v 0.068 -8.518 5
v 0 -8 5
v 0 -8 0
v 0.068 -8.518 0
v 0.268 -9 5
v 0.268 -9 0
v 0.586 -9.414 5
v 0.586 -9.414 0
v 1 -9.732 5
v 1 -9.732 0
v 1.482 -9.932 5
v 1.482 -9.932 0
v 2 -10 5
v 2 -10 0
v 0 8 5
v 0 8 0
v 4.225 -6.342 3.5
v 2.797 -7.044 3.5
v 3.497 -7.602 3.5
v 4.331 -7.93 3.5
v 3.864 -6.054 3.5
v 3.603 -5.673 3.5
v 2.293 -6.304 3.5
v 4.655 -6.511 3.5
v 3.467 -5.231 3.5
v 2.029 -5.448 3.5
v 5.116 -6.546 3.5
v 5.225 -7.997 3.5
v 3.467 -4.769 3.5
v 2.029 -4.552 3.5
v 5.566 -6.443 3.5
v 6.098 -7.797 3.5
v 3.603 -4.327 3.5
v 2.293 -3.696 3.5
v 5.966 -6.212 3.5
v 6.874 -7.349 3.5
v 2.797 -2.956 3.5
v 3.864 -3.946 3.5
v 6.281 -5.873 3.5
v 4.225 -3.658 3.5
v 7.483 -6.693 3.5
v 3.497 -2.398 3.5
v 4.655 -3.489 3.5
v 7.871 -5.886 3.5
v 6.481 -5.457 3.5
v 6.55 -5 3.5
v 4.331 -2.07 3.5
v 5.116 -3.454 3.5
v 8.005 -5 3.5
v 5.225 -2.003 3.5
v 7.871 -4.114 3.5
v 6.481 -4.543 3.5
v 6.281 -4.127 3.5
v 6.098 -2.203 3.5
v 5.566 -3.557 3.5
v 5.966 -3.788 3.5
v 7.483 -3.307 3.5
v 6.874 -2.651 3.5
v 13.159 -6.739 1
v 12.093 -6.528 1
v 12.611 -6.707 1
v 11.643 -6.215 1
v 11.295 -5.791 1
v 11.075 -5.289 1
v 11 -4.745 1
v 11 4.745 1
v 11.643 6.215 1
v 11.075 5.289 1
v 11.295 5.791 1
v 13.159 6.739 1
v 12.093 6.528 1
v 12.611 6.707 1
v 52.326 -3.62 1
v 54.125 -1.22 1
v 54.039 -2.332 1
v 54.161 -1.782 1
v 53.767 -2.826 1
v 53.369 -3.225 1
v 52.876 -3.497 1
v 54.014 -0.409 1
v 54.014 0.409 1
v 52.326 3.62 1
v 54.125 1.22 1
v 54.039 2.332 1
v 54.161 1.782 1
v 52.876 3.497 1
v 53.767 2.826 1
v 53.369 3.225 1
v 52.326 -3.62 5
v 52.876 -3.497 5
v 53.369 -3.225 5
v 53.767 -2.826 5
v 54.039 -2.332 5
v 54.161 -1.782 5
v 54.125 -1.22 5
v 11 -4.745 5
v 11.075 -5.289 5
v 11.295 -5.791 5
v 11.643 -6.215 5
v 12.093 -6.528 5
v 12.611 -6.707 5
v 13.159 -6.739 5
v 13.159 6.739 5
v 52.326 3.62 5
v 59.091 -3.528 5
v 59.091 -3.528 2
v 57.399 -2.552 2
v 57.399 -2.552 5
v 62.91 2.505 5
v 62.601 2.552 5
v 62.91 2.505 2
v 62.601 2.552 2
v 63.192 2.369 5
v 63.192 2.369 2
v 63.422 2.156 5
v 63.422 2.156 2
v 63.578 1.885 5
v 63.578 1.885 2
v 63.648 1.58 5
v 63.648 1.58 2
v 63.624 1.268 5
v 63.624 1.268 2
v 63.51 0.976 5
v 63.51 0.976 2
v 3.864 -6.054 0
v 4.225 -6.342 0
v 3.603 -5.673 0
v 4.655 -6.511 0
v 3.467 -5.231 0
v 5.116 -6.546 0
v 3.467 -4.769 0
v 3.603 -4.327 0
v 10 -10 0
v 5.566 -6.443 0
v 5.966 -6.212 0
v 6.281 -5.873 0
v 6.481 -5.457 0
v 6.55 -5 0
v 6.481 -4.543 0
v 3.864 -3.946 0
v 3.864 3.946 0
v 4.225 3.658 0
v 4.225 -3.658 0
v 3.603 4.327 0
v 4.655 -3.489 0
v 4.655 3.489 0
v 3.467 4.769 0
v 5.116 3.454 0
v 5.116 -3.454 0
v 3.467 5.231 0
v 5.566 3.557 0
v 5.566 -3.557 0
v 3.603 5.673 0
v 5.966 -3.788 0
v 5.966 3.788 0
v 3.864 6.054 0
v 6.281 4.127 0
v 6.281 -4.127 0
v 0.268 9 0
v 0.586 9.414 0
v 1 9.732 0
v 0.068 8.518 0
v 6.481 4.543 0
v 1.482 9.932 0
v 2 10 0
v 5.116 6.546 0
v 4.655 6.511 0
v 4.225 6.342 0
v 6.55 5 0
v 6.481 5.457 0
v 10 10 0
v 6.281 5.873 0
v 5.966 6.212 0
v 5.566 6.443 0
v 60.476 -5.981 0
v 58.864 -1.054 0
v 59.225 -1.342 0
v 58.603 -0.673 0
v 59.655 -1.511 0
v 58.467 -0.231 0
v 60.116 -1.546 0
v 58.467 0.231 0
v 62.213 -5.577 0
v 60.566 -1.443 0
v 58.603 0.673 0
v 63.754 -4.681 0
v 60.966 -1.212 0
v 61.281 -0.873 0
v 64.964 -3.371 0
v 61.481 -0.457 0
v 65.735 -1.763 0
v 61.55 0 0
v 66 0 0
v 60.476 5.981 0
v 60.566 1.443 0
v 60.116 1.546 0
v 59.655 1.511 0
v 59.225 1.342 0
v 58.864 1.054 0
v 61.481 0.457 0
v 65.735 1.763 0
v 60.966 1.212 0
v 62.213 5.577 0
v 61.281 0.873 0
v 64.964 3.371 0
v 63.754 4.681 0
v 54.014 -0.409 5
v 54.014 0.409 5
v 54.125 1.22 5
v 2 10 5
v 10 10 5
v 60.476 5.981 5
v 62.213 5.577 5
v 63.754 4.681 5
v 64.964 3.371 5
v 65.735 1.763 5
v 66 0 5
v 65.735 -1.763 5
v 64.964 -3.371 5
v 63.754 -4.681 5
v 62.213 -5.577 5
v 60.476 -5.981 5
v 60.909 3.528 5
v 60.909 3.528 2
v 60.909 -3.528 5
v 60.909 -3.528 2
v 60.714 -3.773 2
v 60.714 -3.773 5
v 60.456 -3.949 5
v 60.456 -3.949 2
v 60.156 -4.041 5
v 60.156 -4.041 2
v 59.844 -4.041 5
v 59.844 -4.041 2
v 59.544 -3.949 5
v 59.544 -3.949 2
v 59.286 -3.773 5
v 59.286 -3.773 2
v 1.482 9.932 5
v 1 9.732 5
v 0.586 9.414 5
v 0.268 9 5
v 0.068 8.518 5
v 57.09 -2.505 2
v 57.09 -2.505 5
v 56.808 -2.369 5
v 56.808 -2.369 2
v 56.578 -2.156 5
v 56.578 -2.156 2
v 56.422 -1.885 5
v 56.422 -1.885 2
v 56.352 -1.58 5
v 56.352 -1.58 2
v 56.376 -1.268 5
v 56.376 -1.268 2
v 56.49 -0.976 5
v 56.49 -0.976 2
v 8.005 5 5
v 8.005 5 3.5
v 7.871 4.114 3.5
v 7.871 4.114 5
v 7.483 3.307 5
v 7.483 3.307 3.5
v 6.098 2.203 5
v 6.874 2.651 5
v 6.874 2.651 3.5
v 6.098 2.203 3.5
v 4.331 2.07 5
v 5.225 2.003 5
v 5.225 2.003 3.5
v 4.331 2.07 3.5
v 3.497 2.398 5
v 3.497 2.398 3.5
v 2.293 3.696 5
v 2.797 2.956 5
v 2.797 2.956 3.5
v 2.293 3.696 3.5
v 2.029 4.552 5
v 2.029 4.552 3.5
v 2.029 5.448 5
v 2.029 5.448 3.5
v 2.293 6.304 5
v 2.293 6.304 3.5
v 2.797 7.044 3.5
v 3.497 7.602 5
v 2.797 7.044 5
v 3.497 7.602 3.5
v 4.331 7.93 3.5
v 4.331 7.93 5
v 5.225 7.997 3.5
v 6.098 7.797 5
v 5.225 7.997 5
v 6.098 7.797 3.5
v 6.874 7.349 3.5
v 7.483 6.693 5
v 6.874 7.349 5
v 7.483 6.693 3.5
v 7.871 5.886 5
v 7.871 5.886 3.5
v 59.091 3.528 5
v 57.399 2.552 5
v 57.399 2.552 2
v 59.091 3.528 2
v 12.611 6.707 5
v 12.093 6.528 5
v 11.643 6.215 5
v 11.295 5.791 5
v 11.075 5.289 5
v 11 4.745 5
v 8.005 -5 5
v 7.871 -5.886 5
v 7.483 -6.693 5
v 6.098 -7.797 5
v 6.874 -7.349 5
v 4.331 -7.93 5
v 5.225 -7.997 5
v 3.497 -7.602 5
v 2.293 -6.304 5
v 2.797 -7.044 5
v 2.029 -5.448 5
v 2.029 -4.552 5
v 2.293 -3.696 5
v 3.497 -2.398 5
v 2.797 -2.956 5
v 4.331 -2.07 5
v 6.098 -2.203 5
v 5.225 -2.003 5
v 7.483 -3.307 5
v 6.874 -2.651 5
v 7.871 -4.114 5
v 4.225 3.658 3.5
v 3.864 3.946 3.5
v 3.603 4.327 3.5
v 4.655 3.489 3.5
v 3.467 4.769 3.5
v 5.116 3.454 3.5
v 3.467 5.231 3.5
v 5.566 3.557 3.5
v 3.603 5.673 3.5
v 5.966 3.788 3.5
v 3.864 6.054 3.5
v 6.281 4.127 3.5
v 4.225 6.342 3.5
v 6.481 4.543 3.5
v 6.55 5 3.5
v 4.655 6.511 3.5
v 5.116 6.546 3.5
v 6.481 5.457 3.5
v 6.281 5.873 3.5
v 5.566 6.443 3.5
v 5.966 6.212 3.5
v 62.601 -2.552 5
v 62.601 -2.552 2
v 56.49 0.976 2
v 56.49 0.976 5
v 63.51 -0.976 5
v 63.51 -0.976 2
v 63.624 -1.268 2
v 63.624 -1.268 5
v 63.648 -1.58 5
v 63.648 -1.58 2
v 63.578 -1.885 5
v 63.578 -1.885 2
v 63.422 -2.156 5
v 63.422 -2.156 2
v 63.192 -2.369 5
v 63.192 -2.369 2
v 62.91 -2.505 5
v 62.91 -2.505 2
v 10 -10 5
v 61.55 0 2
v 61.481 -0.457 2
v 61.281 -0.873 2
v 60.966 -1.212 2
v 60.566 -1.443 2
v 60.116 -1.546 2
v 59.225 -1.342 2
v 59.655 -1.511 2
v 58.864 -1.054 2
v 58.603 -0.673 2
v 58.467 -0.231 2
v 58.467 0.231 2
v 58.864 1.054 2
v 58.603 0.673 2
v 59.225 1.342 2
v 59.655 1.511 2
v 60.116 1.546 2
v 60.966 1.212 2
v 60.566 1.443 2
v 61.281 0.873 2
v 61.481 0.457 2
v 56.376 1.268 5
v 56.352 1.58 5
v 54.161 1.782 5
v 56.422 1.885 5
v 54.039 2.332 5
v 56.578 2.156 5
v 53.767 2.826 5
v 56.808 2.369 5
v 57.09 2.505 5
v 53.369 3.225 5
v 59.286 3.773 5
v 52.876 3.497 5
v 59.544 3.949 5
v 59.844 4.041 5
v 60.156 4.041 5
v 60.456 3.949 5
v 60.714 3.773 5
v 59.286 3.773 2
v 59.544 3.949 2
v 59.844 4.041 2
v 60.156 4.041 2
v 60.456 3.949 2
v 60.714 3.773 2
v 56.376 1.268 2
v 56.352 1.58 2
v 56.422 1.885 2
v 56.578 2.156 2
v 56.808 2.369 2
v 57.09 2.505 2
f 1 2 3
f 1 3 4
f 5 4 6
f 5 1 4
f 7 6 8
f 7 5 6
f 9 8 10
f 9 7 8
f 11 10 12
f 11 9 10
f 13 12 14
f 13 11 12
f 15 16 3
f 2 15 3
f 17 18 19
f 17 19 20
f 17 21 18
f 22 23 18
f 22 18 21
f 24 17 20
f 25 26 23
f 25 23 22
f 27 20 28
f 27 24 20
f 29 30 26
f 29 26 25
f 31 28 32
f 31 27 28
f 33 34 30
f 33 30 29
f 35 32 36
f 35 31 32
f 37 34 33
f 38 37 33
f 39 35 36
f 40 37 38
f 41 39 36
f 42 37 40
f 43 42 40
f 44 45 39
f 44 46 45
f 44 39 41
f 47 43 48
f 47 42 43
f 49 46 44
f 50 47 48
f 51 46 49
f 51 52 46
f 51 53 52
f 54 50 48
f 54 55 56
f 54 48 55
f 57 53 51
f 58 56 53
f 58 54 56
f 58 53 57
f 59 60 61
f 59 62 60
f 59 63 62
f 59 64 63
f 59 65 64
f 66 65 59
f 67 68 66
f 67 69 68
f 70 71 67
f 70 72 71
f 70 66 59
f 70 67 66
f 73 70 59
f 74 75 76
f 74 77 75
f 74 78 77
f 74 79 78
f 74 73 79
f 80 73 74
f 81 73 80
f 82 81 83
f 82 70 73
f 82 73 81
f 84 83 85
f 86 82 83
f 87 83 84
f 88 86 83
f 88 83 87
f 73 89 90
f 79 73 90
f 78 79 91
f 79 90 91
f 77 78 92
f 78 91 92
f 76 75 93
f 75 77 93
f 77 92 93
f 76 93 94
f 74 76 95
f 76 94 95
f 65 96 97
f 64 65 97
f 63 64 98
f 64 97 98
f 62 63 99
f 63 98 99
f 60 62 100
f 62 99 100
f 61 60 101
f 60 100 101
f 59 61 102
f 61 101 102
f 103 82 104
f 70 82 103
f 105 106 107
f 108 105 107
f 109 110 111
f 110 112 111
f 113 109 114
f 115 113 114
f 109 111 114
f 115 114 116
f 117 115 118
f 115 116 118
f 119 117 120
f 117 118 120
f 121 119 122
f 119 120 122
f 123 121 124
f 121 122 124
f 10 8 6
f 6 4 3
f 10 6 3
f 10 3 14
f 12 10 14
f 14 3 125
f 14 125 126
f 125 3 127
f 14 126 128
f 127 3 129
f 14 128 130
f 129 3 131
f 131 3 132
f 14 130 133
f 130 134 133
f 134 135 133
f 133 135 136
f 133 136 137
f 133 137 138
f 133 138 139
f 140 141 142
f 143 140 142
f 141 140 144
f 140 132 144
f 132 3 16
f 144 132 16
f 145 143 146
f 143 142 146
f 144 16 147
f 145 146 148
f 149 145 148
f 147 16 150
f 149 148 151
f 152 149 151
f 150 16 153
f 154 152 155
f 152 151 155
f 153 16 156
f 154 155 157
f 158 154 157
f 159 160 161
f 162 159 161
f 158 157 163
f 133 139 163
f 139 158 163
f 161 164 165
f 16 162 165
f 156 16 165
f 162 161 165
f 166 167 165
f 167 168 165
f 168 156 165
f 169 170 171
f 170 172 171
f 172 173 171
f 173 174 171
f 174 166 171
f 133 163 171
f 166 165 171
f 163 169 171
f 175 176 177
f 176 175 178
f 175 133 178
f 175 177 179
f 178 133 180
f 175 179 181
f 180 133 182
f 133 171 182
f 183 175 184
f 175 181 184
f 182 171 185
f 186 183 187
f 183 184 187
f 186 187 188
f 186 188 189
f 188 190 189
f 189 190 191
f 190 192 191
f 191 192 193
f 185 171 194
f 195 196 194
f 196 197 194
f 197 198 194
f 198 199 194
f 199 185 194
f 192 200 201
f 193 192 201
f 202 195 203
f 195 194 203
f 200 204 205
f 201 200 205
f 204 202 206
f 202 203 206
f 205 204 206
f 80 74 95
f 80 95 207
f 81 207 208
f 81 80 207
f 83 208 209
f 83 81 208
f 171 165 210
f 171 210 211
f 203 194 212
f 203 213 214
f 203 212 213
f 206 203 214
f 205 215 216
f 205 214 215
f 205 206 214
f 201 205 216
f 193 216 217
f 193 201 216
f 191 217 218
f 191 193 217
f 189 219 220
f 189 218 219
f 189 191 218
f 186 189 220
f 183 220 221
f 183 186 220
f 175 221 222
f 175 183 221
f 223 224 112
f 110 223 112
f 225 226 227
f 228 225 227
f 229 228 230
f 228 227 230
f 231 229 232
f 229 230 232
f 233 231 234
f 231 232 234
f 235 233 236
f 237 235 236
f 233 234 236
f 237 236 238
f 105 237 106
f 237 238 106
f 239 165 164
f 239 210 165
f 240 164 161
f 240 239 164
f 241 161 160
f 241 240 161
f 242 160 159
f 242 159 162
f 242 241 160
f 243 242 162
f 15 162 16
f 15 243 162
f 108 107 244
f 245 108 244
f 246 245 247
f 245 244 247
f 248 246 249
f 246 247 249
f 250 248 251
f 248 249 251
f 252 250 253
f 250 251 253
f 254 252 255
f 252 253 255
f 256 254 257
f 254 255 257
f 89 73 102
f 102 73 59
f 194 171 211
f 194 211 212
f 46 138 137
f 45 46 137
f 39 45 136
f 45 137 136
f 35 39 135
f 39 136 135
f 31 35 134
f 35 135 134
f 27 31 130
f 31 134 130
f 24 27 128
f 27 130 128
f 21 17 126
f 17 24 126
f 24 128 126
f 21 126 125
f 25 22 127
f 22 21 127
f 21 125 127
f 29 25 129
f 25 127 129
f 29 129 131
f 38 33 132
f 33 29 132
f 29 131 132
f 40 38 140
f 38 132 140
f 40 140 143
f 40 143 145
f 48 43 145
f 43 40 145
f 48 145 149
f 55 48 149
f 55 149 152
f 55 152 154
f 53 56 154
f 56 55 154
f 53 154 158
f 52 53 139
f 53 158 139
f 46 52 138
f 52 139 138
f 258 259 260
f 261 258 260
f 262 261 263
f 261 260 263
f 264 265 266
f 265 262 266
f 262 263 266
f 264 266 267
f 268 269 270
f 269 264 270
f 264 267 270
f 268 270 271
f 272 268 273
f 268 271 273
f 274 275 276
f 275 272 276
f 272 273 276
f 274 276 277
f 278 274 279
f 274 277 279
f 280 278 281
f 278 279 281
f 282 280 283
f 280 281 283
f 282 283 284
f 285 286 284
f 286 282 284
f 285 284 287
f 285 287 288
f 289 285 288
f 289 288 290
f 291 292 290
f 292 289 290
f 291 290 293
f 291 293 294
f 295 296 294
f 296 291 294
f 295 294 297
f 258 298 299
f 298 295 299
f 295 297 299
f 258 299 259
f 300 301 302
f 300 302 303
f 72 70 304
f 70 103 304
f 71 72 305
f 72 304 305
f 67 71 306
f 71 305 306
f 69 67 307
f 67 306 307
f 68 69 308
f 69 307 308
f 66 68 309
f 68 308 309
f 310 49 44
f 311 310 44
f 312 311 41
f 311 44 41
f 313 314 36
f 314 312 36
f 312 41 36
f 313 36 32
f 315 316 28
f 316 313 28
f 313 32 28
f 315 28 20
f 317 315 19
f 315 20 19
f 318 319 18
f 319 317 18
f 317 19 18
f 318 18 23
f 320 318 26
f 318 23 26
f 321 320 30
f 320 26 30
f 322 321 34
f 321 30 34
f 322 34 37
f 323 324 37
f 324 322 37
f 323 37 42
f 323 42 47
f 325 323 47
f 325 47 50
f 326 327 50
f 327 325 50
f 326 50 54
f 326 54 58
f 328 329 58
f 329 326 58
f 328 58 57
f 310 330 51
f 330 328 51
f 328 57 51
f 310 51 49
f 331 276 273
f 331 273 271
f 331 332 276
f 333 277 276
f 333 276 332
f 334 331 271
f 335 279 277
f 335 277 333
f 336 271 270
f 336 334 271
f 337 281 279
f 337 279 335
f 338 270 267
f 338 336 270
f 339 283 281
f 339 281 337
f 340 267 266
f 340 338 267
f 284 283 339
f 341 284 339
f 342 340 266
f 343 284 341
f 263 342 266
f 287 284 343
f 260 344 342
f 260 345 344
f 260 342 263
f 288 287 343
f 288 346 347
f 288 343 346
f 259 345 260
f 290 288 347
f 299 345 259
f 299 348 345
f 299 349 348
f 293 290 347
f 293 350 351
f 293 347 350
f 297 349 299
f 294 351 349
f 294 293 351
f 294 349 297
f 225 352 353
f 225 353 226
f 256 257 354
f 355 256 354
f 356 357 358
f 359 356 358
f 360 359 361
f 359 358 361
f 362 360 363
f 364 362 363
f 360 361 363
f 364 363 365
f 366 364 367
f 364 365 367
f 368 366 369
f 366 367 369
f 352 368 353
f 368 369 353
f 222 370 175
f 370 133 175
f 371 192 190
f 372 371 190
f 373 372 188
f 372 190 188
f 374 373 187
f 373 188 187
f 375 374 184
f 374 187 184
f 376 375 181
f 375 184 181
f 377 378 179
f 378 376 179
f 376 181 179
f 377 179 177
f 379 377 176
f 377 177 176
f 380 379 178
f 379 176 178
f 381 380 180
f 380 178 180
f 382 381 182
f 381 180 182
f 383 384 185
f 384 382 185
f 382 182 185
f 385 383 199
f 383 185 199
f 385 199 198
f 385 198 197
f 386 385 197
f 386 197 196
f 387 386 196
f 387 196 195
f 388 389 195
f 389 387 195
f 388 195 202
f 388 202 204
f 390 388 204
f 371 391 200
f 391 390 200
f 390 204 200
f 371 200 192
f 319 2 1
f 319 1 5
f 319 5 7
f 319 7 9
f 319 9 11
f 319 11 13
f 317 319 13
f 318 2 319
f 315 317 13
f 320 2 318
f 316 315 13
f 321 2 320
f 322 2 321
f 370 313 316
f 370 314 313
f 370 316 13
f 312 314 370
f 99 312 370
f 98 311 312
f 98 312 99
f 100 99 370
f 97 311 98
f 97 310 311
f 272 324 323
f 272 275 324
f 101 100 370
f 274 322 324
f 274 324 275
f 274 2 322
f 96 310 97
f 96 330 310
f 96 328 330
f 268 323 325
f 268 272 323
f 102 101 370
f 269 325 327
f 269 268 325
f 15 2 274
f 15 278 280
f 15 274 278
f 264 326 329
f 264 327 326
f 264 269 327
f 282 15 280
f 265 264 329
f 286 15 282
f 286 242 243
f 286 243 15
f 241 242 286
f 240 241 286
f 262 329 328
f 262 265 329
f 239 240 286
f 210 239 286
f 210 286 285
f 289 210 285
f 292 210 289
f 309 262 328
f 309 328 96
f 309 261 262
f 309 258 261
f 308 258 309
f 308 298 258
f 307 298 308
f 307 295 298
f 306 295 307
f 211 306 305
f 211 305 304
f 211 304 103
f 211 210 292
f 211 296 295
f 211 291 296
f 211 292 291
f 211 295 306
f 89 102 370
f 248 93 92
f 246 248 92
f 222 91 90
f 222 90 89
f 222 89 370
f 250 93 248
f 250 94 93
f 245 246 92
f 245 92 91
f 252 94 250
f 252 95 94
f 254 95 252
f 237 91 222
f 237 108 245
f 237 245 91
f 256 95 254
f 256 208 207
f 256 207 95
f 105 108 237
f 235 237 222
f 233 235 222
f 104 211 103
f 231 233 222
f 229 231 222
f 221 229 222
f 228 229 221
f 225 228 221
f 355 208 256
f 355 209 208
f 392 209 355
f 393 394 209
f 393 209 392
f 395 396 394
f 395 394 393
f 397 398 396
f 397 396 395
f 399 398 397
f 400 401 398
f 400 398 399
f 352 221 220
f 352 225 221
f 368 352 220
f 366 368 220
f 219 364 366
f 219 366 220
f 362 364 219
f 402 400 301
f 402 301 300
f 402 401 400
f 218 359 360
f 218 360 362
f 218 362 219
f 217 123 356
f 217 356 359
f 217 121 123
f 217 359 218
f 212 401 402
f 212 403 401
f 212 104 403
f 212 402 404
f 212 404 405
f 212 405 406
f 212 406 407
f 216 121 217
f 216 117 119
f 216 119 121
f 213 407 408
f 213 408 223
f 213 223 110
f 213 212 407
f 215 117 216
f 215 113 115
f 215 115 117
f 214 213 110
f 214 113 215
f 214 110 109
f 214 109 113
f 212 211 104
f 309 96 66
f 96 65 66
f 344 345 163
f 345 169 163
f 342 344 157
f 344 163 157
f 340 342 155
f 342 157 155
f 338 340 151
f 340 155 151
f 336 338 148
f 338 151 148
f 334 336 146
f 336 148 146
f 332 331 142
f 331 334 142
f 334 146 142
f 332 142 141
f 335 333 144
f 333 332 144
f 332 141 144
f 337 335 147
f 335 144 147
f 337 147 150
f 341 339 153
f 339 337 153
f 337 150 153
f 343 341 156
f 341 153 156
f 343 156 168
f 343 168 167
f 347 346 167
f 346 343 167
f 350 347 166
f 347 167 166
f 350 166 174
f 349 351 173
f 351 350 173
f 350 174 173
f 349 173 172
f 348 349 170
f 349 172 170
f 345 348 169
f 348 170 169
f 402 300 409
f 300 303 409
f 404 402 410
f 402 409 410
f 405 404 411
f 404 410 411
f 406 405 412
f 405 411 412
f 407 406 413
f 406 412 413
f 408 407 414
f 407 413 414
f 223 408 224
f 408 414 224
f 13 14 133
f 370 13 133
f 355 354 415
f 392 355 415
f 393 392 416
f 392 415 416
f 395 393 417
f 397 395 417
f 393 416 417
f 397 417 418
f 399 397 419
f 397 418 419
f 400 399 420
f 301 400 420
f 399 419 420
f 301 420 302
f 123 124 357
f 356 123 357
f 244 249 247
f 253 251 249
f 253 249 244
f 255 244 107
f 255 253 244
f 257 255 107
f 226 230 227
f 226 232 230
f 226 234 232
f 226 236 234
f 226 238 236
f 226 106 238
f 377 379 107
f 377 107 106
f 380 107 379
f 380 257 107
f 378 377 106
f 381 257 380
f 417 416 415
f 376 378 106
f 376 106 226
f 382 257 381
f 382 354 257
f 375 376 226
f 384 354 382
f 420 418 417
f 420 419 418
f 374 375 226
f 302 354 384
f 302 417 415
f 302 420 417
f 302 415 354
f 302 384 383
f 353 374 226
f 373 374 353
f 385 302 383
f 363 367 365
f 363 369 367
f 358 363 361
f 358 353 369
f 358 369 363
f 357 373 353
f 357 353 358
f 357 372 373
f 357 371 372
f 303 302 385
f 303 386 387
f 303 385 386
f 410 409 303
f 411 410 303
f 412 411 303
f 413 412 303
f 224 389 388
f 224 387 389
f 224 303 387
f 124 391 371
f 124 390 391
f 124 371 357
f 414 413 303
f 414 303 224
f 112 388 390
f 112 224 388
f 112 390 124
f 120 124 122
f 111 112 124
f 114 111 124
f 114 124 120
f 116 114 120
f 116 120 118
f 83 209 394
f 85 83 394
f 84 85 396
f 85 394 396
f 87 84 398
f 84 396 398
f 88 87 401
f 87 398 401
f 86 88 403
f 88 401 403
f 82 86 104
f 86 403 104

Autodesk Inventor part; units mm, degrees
ref_plane "YZ Plane" through (0, 0, 0) normal (1, 0, 0) x (0, 1, 0)
ref_plane "XZ Plane" through (0, 0, 0) normal (0, 1, 0) x (-1, 0, 0)
ref_plane "XY Plane" through (0, 0, 0) normal (0, 0, 1) x (1, 0, 0)
sketch "スケッチ1" plane through (0, 0, 0) normal (0, 0, 1) x (1, 0, 0)
  circle A0 centre (5, 5) radius 1.55
  circle A1 centre (5, -5) radius 1.55
  line L0 (0, 0) -> (60, 0) construction
  circle A2 centre (60, 0) radius 1.55
  line L1 (0, 10) -> (0, -10)
  line L2 (0, -10) -> (10, -10)
  line L3 (10, -10) -> (60.4762, -5.9811)
  line L4 (10, 10) -> (60.4762, 5.9811)
  arc A3 (60.4762, -5.9811) -> (60.4762, 5.9811) centre (60, 0) ccw
  line L5 (55.0583, -3.4029) -> (11, -6.9109)
  line L6 (55.0583, 3.4029) -> (11, 6.9109)
  arc A4 (55.0583, 3.4029) -> (55.0583, -3.4029) centre (60, 0) ccw
  line L7 (11, -6.9109) -> (11, 6.9109)
  line L8 (5, -5) -> (5, 5) construction
  line L9 (0, 10) -> (10, 10)
  line L10 (8.01, 6.7378) -> (8.01, 3.2622) construction
  line L11 (8.01, 3.2622) -> (5, 1.5244) construction
  line L12 (5, 1.5244) -> (1.99, 3.2622) construction
  line L13 (1.99, 3.2622) -> (1.99, 6.7378) construction
  line L14 (1.99, 6.7378) -> (5, 8.4756) construction
  line L15 (5, 8.4756) -> (8.01, 6.7378) construction
  arc A5 (4.0907, 2.0494) -> (5.9093, 2.0494) centre (5, 2.5744) ccw construction
  arc A6 (7.1007, 2.7372) -> (8.01, 4.3122) centre (7.1007, 3.7872) ccw construction
  arc A7 (8.01, 5.6878) -> (7.1007, 7.2628) centre (7.1007, 6.2128) ccw construction
  arc A8 (5.9093, 7.9506) -> (4.0907, 7.9506) centre (5, 7.4256) ccw construction
  arc A9 (2.8993, 7.2628) -> (1.99, 5.6878) centre (2.8993, 6.2128) ccw construction
  arc A10 (1.99, 4.3122) -> (2.8993, 2.7372) centre (2.8993, 3.7872) ccw construction
  line L16 (8.01, -6.7378) -> (8.01, -3.2622) construction
  line L17 (8.01, -3.2622) -> (5, -1.5244) construction
  line L18 (5, -1.5244) -> (1.99, -3.2622) construction
  line L19 (1.99, -3.2622) -> (1.99, -6.7378) construction
  line L20 (1.99, -6.7378) -> (5, -8.4756) construction
  line L21 (5, -8.4756) -> (8.01, -6.7378) construction
  arc A11 (5.9093, -2.0494) -> (4.0907, -2.0494) centre (5, -2.5744) ccw construction
  arc A12 (8.01, -4.3122) -> (7.1007, -2.7372) centre (7.1007, -3.7872) ccw construction
  arc A13 (7.1007, -7.2628) -> (8.01, -5.6878) centre (7.1007, -6.2128) ccw construction
  arc A14 (4.0907, -7.9506) -> (5.9093, -7.9506) centre (5, -7.4256) ccw construction
  arc A15 (1.99, -5.6878) -> (2.8993, -7.2628) centre (2.8993, -6.2128) ccw construction
  arc A16 (2.8993, -2.7372) -> (1.99, -4.3122) centre (2.8993, -3.7872) ccw construction
  circle A17 centre (60, 0) radius 1.55
  line L22 (63.51, 2.0265) -> (63.51, -2.0265)
  line L23 (63.51, -2.0265) -> (60, -4.053)
  line L24 (60, -4.053) -> (56.49, -2.0265)
  line L25 (56.49, -2.0265) -> (56.49, 2.0265)
  line L26 (56.49, 2.0265) -> (60, 4.053)
  line L27 (60, 4.053) -> (63.51, 2.0265)
  arc A18 (59.0907, -3.528) -> (60.9093, -3.528) centre (60, -3.003) ccw
  arc A19 (62.6007, -2.5515) -> (63.51, -0.9765) centre (62.6007, -1.5015) ccw
  arc A20 (63.51, 0.9765) -> (62.6007, 2.5515) centre (62.6007, 1.5015) ccw
  arc A21 (60.9093, 3.528) -> (59.0907, 3.528) centre (60, 3.003) ccw
  arc A22 (57.3993, 2.5515) -> (56.49, 0.9765) centre (57.3993, 1.5015) ccw
  arc A23 (56.49, -0.9765) -> (57.3993, -2.5515) centre (57.3993, -1.5015) ccw
  line L28 (60, 4.053) -> (60, -4.053) construction
  circle A24 centre (5, 5) radius 3.005
  circle A25 centre (5, -5) radius 3.005
  point P0 (5, 0)
  point P1 (8.01, 3.2622)
  point P2 (8.01, 6.7378)
  point P3 (5, 8.4756)
  point P4 (1.99, 6.7378)
  point P5 (2.8993, 2.7372)
  point P6 (1.99, 4.3122)
  point P7 (1.99, 5.6878)
  point P8 (2.8993, 7.2628)
  point P9 (4.0907, 7.9506)
  point P10 (5.9093, 7.9506)
  point P11 (7.1007, 7.2628)
  point P12 (8.01, 5.6878)
  point P13 (8.01, 4.3122)
  point P14 (7.1007, 2.7372)
  point P15 (7.1007, -2.7372)
  point P16 (8.01, -4.3122)
  point P17 (8.01, -5.6878)
  point P18 (7.1007, -7.2628)
  point P19 (5.9093, -7.9506)
  point P20 (4.0907, -7.9506)
  point P21 (2.8993, -7.2628)
  point P22 (1.99, -5.6878)
  point P23 (1.99, -4.3122)
  point P24 (2.8993, -2.7372)
  point P25 (1.99, -6.7378)
  point P26 (5, -8.4756)
  point P27 (56.49, 2.0265)
  point P28 (56.49, -2.0265)
  point P29 (62.6007, -2.5515)
  point P30 (57.3993, -2.5515)
  point P31 (56.49, -0.9765)
  point P32 (56.49, 0.9765)
  point P33 (57.3993, 2.5515)
  point P34 (59.0907, 3.528)
  point P35 (60.9093, 3.528)
  point P36 (62.6007, 2.5515)
  point P37 (63.51, 0.9765)
  point P38 (63.51, -0.9765)
  dimension "d0" = 10
  dimension "d1" = 3.1
  dimension "d2" = 3.1
  dimension "d3" = 60
  dimension "d4" = 6
  dimension "d33" = 3
  dimension "d34" = 6
  dimension "d35" = 6
  dimension "d40" = 20
  dimension "d41" = 5
  dimension "d42" = 10
  dimension "d43" = 6.02
  dimension "d44" = 2.1
  dimension "d47" = 360
  dimension "d57" = 3.1
  dimension "d58" = 7.02
  dimension "d59" = 2.1
  dimension "d60" = 360
  dimension "d62" = 6.01
extrude "押し出し1" add sketch "スケッチ1" along normal blind 5 contours L9 L4 A3 L3 L2 L1
extrude "押し出し5" add sketch "スケッチ1" along normal blind 3.5 contours A24 | A25
extrude "押し出し6" add sketch "スケッチ1" along normal blind 2 contours A20 L22 | L22 L23 L24 L25 L26 L27 | L27 A20 | A19 L22 | L27 A21 | A19 L23 | L26 A21 | A18 L23 | L26 A22 | A18 L24 | L25 A22 | A23 L24 | L25 A23
extrude "押し出し7" add sketch "スケッチ1" along normal blind 1 contours L5 L7 L6 A4
fillet "フィレット2" radius 2 6 edges at (11, 6.9109, 3) (11, -6.9109, 3) (55.0583, 3.4029, 3) (55.0583, -3.4029, 3) (0, -10, 2.5) (0, 10, 2.5)
properties part number "Trunk_handle_frame" material "アセタール樹脂、黒"
